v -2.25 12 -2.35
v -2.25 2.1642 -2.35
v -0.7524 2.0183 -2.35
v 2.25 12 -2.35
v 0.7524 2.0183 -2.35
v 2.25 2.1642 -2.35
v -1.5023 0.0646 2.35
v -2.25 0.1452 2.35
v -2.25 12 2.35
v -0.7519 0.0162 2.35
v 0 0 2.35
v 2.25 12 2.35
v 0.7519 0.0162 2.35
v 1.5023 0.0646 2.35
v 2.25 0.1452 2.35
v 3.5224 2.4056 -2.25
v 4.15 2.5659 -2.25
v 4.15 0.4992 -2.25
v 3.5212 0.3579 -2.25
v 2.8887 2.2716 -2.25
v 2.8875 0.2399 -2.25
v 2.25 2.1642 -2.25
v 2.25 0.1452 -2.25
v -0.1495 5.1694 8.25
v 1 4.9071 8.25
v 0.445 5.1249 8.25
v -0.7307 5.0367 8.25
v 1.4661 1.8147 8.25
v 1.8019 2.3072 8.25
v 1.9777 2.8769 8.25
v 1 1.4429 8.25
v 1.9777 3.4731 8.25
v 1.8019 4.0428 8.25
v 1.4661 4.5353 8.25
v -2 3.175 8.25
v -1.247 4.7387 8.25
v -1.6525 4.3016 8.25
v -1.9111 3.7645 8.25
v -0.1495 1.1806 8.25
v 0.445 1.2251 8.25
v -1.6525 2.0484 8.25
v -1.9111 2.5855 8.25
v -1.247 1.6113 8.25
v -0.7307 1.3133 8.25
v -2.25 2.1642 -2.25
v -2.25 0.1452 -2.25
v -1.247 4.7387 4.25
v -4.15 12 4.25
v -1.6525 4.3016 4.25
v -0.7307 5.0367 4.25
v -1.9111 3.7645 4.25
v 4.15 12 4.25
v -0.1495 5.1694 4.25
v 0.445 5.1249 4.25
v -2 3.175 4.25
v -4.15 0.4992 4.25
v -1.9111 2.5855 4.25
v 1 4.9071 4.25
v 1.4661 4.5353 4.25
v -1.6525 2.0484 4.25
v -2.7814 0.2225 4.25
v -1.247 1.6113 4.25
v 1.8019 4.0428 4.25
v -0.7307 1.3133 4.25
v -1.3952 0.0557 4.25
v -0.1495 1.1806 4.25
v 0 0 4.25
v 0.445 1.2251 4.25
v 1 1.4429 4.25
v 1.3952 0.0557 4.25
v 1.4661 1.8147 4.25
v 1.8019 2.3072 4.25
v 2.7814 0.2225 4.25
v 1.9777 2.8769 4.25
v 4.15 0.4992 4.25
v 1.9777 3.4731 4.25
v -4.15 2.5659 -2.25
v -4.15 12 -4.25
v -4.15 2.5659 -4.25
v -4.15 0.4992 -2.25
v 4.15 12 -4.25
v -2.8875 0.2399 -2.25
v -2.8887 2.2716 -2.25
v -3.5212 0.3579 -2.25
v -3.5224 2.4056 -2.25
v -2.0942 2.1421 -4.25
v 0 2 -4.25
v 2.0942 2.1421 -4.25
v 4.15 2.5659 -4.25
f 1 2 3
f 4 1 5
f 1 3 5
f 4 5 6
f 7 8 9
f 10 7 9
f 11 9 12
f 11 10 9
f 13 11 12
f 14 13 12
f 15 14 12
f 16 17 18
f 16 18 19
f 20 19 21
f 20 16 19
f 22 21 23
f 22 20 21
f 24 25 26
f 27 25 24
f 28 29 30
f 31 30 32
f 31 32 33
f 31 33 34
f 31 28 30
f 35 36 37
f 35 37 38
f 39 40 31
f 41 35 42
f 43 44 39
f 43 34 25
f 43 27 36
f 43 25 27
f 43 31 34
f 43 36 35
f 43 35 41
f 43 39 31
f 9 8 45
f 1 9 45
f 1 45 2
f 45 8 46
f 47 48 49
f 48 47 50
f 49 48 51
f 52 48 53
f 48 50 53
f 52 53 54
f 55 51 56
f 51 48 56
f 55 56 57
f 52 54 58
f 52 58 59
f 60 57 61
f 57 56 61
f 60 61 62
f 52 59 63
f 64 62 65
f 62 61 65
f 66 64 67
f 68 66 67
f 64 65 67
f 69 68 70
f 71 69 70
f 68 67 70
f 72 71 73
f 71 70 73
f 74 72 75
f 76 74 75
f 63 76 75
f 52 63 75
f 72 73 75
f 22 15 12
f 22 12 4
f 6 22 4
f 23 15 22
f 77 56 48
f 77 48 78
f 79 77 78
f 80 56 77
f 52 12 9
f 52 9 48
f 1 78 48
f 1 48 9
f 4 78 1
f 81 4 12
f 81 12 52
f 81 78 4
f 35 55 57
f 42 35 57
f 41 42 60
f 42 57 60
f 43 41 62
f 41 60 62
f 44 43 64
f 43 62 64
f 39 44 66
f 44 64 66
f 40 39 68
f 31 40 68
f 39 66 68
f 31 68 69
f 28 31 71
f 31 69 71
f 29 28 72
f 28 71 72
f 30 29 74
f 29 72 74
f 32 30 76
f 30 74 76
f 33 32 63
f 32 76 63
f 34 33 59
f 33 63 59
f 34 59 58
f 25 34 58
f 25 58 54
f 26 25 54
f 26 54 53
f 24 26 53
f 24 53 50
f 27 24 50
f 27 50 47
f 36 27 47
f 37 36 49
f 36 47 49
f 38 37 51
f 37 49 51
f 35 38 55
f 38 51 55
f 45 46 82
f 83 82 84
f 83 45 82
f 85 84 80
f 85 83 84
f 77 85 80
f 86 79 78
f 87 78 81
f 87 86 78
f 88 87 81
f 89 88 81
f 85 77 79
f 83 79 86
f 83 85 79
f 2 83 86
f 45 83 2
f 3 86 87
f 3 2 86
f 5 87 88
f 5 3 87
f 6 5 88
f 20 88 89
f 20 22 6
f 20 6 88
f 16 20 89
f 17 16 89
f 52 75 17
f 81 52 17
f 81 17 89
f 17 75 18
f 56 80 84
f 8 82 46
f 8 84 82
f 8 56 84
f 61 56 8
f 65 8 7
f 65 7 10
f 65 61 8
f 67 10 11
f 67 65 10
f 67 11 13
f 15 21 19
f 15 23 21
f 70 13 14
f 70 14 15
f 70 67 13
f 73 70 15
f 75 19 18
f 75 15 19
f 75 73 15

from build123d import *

# Parameters (mm, degrees)
CROQUIS1_W              = 8.3
CROQUIS1_H              = 8.5
CROQUIS1_W_2            = 4.5
CROQUIS1_H_2            = 4.7
SALIENTE_EXTRUIR1_DEPTH = 12
CORTAR_EXTRUIR3_START   = -8.5
CORTAR_EXTRUIR3_DEPTH   = 8.5
CROQUIS3_R              = 2
SALIENTE_EXTRUIR2_DEPTH = 4
CORTAR_EXTRUIR4_START   = -2
CORTAR_EXTRUIR4_DEPTH   = 2


# Read off the part's stored shape, not the designer's step: Cortar-Extruir3
with BuildPart() as part:
    # Croquis1 → Saliente-Extruir1 (new body)
    with BuildSketch(Plane(origin=(0, 0, 0), x_dir=(1, 0, 0), z_dir=(0, 1, 0))):
        Rectangle(CROQUIS1_W, CROQUIS1_H)
        Rectangle(CROQUIS1_W_2, CROQUIS1_H_2, mode=Mode.SUBTRACT)
    extrude(amount=SALIENTE_EXTRUIR1_DEPTH)

    # Cortar-Extruir3 outline → Cortar-Extruir3 (cut)
    with BuildSketch(Plane(origin=(0, 0, -4.25), x_dir=(-1, 0, 0), z_dir=(0, 0, -1)).offset(CORTAR_EXTRUIR3_START)):
        with BuildLine():
            Line((0, 0), (4.15, 0))
            Line((4.15, 0), (4.15, 0.499191196))
            ThreePointArc((4.15, 0.499191196), (2.089957646, 0.125245986), (0, 0))
        make_face()
        with BuildLine():
            Line((-4.15, 0.499191196), (-4.15, 0))
            Line((-4.15, 0), (0, 0))
            ThreePointArc((0, 0), (-2.089957646, 0.125245986), (-4.15, 0.499191196))
        make_face()
    extrude(amount=CORTAR_EXTRUIR3_DEPTH, mode=Mode.SUBTRACT)

    # Croquis3 → Saliente-Extruir2 (add)
    with BuildSketch(Plane.XY.offset(4.25)):
        with Locations(Location((0, 3.175, 0), (0, 0, 180))):
            Circle(CROQUIS3_R)
    extrude(amount=SALIENTE_EXTRUIR2_DEPTH)

    # Croquis4 → Cortar-Extruir4 (cut)
    with BuildSketch(Plane(origin=(0, 0, -4.25), x_dir=(-1, 0, 0), z_dir=(0, 0, -1)).offset(CORTAR_EXTRUIR4_START)):
        with BuildLine():
            Line((-4.15, 2.565894737), (-4.15, 0.499191196))
            ThreePointArc((-4.15, 0.499191196), (0, 0), (4.15, 0.499191196))
            Line((4.15, 0.499191196), (4.15, 2.565894737))
            ThreePointArc((4.15, 2.565894737), (0, 2), (-4.15, 2.565894737))
        make_face()
    extrude(amount=CORTAR_EXTRUIR4_DEPTH, mode=Mode.SUBTRACT)


solid = part.part
